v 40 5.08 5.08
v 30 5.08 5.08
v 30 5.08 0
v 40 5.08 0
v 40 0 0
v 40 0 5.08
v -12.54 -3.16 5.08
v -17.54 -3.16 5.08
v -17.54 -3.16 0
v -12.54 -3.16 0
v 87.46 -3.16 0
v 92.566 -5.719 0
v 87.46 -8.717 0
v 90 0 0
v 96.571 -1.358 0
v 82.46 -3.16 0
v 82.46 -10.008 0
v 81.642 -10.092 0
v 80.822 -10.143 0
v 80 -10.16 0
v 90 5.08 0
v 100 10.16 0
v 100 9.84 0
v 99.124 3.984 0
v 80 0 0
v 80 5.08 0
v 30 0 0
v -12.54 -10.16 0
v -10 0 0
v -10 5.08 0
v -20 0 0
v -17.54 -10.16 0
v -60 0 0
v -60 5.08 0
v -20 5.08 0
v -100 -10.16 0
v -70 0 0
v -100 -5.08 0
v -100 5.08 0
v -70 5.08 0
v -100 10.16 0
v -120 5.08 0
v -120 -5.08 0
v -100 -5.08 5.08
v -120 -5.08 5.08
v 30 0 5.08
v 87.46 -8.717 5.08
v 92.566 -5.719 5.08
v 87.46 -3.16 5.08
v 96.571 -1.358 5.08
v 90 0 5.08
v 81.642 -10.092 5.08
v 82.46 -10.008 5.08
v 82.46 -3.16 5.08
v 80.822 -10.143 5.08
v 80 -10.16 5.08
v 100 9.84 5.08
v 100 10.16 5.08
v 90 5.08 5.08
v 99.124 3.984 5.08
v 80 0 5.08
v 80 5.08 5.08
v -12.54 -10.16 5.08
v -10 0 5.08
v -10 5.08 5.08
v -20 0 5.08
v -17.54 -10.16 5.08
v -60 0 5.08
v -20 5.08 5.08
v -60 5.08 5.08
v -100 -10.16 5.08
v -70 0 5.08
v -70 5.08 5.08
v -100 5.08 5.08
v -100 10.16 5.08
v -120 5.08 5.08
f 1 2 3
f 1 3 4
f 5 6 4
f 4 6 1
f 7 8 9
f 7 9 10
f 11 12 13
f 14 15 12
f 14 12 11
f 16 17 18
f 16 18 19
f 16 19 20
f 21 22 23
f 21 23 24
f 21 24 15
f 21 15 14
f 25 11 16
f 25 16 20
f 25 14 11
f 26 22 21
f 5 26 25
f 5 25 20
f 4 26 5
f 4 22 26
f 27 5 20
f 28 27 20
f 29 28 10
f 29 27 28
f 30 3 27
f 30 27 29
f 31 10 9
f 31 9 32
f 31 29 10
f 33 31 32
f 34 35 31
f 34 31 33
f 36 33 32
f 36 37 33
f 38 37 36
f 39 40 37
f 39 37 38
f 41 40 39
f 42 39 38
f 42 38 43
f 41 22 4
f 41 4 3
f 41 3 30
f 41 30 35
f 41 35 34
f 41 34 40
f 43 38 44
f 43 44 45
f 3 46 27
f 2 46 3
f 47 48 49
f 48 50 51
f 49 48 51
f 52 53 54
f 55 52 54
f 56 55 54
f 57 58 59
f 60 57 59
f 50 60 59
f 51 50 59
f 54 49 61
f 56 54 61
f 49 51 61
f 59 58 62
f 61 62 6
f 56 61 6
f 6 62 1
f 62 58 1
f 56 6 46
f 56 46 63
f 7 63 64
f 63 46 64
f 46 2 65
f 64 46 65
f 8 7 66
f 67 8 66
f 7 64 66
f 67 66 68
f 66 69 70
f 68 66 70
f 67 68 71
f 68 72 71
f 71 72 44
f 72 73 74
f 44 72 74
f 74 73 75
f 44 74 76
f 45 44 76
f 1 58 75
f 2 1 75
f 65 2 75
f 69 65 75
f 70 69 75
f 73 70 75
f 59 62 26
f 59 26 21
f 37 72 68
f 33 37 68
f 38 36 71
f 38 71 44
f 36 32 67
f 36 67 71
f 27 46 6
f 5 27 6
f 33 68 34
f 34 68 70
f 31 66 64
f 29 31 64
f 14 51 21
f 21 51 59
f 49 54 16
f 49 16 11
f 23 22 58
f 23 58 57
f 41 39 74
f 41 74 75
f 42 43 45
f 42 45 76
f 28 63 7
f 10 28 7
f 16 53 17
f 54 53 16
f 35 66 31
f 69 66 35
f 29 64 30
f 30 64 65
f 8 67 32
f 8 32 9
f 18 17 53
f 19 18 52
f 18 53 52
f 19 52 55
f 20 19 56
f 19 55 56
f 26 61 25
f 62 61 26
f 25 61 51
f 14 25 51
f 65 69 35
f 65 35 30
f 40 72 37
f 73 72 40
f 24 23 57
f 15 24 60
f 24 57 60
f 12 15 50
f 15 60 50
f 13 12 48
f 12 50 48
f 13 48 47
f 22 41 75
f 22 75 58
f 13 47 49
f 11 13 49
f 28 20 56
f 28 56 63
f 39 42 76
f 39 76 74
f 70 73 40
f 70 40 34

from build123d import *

# Parameters (mm, degrees)
BOSS_EXTRUDE1_DEPTH = 5.08
FILLET1_R           = 20
SKETCH2_W           = 5
SKETCH2_H           = 7
SKETCH2_W_2         = 10
SKETCH2_H_2         = 5.08
CUT_EXTRUDE1_DEPTH  = 6.08


with BuildPart() as part:
    # Sketch1 → Boss-Extrude1 (new body)
    with BuildSketch(Plane.XY):
        Polygon((-100, 5.08), (-100, 10.16), (100, 10.16), (100, -10.16), (-100, -10.16), (-100, -5.08), (-120, -5.08), (-120, 5.08), align=None)
    extrude(amount=BOSS_EXTRUDE1_DEPTH)

    # Fillet1
    fillet1_edges = [part.edges().sort_by_distance(p)[0] for p in [
        (100, -10.16, 2.54),
    ]]
    fillet(fillet1_edges, radius=FILLET1_R)

    # Sketch2 → Cut-Extrude1 (cut, through all)
    with BuildSketch(Plane.XY.offset(5.08)):
        with Locations((-15.04, -6.66)):
            Rectangle(SKETCH2_W, SKETCH2_H)
        with Locations((84.96, -6.66)):
            Rectangle(SKETCH2_W, SKETCH2_H)
        with Locations((-65, 2.54)):
            Rectangle(SKETCH2_W_2, SKETCH2_H_2)
        with Locations((-15, 2.54)):
            Rectangle(SKETCH2_W_2, SKETCH2_H_2)
        with Locations((35, 2.54)):
            Rectangle(SKETCH2_W_2, SKETCH2_H_2)
        with Locations((85, 2.54)):
            Rectangle(SKETCH2_W_2, SKETCH2_H_2)
    extrude(amount=-CUT_EXTRUDE1_DEPTH, mode=Mode.SUBTRACT)


solid = part.part
